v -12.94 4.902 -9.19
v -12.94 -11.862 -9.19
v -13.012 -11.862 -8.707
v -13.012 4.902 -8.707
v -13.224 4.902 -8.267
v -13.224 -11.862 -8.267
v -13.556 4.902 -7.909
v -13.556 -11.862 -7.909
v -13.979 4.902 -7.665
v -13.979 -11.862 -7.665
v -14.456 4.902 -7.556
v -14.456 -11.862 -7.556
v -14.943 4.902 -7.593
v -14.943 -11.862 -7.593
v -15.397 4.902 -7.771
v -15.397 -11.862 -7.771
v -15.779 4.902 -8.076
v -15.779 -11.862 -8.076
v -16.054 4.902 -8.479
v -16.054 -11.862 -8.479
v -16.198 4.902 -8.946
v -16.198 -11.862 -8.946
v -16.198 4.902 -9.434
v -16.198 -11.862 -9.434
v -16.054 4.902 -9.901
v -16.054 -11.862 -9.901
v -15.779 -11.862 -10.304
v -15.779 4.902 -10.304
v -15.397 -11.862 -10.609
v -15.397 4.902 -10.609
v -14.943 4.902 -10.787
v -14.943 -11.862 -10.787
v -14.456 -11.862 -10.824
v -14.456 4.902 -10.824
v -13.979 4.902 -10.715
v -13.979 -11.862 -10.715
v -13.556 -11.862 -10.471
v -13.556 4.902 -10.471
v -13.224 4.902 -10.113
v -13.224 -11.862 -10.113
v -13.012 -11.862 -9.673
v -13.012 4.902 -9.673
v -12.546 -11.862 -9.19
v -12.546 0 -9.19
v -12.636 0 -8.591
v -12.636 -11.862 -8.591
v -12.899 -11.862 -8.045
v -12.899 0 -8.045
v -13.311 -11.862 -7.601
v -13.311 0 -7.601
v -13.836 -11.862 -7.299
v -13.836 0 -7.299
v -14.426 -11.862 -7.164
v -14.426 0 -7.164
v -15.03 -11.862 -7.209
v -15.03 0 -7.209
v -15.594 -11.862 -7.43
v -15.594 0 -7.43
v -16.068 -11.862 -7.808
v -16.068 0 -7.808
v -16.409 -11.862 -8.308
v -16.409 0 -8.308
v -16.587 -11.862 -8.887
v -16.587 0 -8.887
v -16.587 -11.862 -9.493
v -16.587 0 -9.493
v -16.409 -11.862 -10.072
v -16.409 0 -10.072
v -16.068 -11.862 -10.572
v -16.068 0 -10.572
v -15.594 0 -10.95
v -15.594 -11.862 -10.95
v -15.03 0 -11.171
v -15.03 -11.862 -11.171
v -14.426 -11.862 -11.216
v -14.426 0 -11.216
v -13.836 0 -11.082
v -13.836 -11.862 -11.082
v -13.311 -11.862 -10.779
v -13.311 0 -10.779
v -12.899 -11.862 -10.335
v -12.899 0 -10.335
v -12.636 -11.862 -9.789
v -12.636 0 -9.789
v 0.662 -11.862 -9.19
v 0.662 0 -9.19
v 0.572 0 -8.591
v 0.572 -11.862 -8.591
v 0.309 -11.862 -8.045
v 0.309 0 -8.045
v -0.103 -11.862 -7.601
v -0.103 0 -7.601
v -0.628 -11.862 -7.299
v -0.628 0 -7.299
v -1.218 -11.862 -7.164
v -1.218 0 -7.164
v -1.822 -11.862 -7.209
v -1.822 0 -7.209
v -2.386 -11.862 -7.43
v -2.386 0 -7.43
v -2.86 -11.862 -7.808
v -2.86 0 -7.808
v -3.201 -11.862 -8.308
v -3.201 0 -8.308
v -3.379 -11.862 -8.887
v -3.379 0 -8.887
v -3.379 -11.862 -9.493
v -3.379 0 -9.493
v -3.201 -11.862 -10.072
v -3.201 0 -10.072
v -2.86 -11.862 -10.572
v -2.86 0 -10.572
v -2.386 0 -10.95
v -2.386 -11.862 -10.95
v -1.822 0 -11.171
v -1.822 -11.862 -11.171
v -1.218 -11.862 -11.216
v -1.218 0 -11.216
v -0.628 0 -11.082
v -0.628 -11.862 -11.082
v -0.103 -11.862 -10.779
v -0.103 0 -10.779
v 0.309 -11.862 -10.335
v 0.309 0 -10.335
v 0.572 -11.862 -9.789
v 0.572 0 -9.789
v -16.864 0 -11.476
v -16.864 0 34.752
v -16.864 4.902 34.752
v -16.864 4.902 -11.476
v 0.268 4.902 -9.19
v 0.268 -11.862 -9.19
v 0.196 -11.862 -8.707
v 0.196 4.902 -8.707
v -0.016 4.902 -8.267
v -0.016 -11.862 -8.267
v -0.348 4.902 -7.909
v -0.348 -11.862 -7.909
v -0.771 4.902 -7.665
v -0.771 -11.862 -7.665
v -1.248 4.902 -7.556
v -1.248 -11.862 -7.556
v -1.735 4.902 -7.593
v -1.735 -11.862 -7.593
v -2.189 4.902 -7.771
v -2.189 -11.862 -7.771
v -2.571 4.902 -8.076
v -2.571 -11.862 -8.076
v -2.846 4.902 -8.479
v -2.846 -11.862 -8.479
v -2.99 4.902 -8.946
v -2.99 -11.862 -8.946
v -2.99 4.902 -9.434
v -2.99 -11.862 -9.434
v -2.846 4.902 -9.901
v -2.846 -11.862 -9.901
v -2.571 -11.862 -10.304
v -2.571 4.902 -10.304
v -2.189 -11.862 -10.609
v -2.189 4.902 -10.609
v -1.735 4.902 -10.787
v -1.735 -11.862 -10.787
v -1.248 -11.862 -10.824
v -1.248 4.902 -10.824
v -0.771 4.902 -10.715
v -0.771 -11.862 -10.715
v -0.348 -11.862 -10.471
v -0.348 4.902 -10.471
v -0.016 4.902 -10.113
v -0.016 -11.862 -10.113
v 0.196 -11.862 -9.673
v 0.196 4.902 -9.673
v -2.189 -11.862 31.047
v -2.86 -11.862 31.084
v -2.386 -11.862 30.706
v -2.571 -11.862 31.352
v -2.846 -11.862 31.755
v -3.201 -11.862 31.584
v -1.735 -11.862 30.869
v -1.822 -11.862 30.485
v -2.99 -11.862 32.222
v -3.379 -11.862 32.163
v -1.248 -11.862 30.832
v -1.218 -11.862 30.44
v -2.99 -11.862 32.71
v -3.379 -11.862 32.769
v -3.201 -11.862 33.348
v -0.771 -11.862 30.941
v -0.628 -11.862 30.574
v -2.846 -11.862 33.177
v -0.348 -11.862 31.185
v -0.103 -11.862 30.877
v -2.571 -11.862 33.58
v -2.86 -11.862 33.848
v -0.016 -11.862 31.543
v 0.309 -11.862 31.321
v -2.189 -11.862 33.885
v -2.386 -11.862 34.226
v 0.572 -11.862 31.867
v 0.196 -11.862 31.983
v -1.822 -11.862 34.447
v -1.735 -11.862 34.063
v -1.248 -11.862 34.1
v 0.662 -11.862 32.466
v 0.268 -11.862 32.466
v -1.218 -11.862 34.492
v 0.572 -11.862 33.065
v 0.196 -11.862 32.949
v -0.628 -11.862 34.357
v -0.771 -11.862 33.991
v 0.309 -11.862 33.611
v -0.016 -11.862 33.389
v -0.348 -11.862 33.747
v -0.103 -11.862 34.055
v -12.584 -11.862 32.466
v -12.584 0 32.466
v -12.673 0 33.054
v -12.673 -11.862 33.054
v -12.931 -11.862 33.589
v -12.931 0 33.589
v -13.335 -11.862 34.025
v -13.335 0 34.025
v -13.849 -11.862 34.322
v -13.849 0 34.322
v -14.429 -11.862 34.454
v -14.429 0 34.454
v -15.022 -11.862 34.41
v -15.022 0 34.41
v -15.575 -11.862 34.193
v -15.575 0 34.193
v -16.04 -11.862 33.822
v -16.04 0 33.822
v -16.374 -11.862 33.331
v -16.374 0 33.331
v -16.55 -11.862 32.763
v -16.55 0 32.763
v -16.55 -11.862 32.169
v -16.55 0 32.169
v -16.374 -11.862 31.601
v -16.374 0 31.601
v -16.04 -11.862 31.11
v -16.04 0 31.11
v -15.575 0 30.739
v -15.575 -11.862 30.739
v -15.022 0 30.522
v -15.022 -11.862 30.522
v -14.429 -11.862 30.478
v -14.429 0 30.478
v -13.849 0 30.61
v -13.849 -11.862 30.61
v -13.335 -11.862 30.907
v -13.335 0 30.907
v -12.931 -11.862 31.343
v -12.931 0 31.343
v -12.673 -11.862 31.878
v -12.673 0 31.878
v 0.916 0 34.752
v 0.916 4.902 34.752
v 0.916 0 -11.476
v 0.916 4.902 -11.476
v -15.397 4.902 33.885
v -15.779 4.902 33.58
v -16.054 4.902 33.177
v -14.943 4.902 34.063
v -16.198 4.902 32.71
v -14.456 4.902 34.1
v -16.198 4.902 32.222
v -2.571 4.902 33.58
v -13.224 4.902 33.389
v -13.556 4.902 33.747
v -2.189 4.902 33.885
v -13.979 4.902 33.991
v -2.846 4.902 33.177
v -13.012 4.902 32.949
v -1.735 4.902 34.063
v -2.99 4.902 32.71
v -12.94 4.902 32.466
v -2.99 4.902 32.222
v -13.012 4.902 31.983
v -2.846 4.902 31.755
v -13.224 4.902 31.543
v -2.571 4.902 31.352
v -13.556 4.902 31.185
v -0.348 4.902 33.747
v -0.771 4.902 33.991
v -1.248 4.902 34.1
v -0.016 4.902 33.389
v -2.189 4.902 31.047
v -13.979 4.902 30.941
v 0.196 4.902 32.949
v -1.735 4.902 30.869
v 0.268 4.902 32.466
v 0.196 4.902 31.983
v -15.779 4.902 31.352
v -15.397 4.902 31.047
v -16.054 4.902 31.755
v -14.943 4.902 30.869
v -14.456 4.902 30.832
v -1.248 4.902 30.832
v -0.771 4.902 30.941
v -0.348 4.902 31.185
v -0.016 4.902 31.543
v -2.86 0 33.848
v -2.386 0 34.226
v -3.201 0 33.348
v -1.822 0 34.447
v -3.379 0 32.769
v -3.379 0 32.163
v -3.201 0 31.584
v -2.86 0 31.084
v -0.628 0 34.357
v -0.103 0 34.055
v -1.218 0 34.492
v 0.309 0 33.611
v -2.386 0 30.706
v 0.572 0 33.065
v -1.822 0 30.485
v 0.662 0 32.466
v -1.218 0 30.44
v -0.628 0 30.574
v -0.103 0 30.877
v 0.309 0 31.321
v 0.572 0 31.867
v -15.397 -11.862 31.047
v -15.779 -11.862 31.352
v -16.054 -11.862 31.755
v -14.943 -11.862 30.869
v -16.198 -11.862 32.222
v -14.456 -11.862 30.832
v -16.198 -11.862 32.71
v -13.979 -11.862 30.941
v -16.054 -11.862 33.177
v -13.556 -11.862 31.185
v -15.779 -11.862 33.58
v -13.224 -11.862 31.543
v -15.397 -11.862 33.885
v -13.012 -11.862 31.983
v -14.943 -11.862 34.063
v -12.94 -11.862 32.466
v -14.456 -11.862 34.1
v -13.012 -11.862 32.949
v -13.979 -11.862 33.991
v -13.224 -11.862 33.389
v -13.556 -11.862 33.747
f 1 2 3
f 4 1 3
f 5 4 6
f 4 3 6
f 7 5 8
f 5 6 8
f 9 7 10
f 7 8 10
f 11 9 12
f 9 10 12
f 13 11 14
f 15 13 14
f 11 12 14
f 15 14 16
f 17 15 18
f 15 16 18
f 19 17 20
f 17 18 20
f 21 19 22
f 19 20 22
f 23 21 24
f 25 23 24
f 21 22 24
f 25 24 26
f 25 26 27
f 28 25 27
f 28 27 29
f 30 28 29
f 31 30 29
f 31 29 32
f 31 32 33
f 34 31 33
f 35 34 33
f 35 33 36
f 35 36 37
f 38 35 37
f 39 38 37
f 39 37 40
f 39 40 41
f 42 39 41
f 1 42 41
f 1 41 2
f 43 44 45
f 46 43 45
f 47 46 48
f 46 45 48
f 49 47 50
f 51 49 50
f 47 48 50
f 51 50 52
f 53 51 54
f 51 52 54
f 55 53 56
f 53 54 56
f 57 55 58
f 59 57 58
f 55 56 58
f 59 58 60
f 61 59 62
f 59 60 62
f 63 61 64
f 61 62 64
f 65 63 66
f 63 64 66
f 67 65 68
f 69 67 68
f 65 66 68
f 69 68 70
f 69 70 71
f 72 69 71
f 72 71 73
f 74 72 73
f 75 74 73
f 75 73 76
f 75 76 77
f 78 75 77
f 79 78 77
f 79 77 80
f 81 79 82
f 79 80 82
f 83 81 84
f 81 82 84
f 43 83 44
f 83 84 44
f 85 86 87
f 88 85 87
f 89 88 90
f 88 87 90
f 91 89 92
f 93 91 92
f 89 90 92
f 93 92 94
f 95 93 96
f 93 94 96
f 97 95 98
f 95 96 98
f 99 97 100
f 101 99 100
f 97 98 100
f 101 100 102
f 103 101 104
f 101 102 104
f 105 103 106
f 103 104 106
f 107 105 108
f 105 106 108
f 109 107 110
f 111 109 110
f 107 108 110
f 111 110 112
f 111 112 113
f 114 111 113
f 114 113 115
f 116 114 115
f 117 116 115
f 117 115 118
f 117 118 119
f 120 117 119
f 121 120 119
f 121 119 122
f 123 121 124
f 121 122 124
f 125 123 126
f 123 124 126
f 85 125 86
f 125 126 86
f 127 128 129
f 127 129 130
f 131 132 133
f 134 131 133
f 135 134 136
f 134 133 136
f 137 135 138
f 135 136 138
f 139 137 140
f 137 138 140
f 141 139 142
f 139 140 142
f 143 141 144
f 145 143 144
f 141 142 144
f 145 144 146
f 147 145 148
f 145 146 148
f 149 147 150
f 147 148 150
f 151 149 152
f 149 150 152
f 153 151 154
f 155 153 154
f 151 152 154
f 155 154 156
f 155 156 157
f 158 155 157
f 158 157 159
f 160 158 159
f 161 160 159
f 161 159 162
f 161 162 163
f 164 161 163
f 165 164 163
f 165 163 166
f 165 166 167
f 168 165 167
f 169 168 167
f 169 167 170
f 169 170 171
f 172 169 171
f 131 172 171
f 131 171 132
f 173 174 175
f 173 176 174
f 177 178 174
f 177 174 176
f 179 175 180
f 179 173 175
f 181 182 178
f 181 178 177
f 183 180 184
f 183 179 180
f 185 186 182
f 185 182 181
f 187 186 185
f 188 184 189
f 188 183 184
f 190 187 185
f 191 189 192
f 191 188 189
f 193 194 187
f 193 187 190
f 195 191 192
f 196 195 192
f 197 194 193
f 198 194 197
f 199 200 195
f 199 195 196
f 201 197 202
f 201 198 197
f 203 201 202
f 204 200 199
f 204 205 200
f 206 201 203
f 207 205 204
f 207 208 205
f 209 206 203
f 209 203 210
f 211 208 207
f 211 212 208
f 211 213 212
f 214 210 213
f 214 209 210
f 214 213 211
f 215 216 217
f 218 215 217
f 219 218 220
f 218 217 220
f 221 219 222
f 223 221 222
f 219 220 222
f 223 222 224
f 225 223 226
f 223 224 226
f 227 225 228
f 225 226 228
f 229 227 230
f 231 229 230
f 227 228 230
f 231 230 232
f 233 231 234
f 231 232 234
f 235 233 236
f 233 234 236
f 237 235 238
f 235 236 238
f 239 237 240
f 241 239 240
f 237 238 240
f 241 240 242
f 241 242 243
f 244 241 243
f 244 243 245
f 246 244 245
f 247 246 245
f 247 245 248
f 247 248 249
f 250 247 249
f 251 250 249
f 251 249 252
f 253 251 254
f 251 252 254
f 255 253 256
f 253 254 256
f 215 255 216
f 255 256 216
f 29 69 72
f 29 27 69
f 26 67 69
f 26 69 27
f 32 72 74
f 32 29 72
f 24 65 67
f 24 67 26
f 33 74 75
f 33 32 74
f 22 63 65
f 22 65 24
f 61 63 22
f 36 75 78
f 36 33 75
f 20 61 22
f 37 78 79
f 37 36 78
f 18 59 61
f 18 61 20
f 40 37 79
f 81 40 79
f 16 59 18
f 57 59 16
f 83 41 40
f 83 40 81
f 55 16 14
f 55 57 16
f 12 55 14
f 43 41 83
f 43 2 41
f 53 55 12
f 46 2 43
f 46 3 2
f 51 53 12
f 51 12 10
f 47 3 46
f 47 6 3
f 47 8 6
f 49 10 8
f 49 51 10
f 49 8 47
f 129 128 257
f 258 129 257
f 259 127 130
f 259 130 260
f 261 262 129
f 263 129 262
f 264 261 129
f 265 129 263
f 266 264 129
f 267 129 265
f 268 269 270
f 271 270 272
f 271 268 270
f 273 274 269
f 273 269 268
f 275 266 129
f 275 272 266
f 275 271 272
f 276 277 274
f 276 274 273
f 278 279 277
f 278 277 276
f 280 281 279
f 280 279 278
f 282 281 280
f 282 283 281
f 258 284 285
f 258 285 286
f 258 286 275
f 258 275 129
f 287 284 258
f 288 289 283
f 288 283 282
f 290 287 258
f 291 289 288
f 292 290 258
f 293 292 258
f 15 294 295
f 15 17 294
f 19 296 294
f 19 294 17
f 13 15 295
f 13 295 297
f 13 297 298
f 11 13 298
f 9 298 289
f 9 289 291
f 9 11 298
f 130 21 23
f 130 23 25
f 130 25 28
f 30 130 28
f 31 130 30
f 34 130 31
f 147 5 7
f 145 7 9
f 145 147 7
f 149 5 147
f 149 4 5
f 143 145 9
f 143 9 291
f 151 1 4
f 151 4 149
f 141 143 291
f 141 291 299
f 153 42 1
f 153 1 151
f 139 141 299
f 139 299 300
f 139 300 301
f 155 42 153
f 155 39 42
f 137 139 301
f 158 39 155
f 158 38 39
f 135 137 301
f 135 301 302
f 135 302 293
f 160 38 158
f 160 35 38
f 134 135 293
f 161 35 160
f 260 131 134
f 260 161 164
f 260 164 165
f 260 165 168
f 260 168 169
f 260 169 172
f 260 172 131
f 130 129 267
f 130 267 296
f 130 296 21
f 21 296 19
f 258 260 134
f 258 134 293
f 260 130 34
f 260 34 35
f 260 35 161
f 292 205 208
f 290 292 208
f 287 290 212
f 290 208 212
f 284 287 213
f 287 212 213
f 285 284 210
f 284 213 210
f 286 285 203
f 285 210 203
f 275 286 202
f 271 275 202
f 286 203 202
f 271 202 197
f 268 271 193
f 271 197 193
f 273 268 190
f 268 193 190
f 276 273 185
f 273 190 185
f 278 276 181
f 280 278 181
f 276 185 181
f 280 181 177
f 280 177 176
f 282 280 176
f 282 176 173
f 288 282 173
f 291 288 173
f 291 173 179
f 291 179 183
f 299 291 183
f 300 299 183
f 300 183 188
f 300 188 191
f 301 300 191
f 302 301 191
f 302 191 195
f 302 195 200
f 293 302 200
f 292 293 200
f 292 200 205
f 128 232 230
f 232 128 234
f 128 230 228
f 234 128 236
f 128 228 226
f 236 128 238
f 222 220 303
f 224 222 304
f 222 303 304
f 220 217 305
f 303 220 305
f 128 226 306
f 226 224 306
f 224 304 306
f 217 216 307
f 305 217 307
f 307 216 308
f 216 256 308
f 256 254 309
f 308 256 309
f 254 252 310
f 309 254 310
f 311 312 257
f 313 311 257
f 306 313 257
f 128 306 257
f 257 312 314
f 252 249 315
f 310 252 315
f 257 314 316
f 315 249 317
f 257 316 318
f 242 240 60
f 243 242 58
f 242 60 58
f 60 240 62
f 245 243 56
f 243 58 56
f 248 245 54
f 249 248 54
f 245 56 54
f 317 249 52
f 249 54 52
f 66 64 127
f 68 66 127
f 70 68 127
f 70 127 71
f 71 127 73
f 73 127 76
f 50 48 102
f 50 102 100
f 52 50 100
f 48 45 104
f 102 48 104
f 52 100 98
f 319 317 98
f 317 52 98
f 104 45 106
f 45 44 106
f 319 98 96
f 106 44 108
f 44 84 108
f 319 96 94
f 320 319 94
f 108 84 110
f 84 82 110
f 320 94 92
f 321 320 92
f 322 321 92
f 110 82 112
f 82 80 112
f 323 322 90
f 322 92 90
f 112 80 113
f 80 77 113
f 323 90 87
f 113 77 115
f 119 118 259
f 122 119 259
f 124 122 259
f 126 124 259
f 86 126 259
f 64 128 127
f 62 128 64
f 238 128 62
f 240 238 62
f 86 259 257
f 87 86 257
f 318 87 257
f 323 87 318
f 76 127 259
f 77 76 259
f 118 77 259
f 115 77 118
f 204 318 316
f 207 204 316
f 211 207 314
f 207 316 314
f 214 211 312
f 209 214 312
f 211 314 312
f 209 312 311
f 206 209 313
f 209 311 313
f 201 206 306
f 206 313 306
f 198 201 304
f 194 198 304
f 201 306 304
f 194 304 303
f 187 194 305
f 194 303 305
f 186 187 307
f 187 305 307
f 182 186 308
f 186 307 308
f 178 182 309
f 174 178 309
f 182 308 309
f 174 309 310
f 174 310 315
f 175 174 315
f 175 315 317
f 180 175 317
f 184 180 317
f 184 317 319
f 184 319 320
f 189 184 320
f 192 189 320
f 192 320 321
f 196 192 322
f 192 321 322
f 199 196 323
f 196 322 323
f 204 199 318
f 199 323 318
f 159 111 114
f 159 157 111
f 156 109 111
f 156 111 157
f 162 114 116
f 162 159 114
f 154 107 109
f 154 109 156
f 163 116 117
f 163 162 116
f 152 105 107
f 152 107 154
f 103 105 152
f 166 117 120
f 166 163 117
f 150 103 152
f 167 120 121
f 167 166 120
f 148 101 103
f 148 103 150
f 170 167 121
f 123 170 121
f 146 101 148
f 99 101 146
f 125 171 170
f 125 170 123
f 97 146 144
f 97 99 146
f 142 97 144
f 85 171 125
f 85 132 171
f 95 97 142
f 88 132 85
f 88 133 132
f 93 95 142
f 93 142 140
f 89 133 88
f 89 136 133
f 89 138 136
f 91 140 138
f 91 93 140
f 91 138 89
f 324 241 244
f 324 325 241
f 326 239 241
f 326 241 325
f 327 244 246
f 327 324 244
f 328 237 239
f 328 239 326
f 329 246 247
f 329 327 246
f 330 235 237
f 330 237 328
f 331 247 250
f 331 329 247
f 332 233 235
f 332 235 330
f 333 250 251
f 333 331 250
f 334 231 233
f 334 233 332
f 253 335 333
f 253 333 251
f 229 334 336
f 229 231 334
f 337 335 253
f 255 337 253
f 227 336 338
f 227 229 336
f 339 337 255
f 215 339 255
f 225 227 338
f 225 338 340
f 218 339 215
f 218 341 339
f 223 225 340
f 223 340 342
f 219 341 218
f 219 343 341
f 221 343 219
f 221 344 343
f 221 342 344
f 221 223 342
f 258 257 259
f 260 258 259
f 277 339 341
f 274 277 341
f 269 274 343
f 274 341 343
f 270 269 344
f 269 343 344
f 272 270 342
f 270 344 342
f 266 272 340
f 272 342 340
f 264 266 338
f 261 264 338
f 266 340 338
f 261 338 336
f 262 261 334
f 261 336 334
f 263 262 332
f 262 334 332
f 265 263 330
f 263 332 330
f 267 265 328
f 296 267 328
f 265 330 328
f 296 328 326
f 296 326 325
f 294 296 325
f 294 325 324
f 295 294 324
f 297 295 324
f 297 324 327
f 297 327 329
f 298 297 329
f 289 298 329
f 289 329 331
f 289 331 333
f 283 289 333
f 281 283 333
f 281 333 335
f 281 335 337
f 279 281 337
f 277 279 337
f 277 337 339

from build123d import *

# Parameters (mm, degrees)
SKETCH1_W           = 17.78
SKETCH1_H           = 46.228
BOSS_EXTRUDE1_DEPTH = 4.9022
SKETCH2_R           = 1.9939
SKETCH2_R_2         = 2.032
BOSS_EXTRUDE2_DEPTH = 11.8618
SKETCH3_R           = 1.6383
CUT_EXTRUDE1_DEPTH  = 17.764


with BuildPart() as part:
    # Sketch1 → Boss-Extrude1 (new body)
    with BuildSketch(Plane(origin=(0, 0, 0), x_dir=(1, 0, 0), z_dir=(0, 1, 0))):
        with Locations((-7.973944862, -11.637942607)):
            Rectangle(SKETCH1_W, SKETCH1_H)
    extrude(amount=BOSS_EXTRUDE1_DEPTH)

    # Sketch2 → Boss-Extrude2 (add)
    with BuildSketch(Plane.XZ):
        with Locations((-14.577944862, 32.465942607)):
            Circle(SKETCH2_R)
        with Locations((-1.369944862, 32.465942607)):
            Circle(SKETCH2_R_2)
        with Locations((-1.369944862, -9.190057393)):
            Circle(SKETCH2_R_2)
        with Locations((-14.577944862, -9.190057393)):
            Circle(SKETCH2_R_2)
    extrude(amount=BOSS_EXTRUDE2_DEPTH)

    # Sketch3 → Cut-Extrude1 (cut, through all)
    with BuildSketch(Plane.XZ.offset(11.8618)):
        with Locations((-14.577944862, 32.465942607)):
            Circle(SKETCH3_R)
        with Locations((-14.577944862, -9.190057393)):
            Circle(SKETCH3_R)
        with Locations((-1.369944862, -9.190057393)):
            Circle(SKETCH3_R)
        with Locations((-1.369944862, 32.465942607)):
            Circle(SKETCH3_R)
    extrude(amount=-CUT_EXTRUDE1_DEPTH, mode=Mode.SUBTRACT)


solid = part.part
